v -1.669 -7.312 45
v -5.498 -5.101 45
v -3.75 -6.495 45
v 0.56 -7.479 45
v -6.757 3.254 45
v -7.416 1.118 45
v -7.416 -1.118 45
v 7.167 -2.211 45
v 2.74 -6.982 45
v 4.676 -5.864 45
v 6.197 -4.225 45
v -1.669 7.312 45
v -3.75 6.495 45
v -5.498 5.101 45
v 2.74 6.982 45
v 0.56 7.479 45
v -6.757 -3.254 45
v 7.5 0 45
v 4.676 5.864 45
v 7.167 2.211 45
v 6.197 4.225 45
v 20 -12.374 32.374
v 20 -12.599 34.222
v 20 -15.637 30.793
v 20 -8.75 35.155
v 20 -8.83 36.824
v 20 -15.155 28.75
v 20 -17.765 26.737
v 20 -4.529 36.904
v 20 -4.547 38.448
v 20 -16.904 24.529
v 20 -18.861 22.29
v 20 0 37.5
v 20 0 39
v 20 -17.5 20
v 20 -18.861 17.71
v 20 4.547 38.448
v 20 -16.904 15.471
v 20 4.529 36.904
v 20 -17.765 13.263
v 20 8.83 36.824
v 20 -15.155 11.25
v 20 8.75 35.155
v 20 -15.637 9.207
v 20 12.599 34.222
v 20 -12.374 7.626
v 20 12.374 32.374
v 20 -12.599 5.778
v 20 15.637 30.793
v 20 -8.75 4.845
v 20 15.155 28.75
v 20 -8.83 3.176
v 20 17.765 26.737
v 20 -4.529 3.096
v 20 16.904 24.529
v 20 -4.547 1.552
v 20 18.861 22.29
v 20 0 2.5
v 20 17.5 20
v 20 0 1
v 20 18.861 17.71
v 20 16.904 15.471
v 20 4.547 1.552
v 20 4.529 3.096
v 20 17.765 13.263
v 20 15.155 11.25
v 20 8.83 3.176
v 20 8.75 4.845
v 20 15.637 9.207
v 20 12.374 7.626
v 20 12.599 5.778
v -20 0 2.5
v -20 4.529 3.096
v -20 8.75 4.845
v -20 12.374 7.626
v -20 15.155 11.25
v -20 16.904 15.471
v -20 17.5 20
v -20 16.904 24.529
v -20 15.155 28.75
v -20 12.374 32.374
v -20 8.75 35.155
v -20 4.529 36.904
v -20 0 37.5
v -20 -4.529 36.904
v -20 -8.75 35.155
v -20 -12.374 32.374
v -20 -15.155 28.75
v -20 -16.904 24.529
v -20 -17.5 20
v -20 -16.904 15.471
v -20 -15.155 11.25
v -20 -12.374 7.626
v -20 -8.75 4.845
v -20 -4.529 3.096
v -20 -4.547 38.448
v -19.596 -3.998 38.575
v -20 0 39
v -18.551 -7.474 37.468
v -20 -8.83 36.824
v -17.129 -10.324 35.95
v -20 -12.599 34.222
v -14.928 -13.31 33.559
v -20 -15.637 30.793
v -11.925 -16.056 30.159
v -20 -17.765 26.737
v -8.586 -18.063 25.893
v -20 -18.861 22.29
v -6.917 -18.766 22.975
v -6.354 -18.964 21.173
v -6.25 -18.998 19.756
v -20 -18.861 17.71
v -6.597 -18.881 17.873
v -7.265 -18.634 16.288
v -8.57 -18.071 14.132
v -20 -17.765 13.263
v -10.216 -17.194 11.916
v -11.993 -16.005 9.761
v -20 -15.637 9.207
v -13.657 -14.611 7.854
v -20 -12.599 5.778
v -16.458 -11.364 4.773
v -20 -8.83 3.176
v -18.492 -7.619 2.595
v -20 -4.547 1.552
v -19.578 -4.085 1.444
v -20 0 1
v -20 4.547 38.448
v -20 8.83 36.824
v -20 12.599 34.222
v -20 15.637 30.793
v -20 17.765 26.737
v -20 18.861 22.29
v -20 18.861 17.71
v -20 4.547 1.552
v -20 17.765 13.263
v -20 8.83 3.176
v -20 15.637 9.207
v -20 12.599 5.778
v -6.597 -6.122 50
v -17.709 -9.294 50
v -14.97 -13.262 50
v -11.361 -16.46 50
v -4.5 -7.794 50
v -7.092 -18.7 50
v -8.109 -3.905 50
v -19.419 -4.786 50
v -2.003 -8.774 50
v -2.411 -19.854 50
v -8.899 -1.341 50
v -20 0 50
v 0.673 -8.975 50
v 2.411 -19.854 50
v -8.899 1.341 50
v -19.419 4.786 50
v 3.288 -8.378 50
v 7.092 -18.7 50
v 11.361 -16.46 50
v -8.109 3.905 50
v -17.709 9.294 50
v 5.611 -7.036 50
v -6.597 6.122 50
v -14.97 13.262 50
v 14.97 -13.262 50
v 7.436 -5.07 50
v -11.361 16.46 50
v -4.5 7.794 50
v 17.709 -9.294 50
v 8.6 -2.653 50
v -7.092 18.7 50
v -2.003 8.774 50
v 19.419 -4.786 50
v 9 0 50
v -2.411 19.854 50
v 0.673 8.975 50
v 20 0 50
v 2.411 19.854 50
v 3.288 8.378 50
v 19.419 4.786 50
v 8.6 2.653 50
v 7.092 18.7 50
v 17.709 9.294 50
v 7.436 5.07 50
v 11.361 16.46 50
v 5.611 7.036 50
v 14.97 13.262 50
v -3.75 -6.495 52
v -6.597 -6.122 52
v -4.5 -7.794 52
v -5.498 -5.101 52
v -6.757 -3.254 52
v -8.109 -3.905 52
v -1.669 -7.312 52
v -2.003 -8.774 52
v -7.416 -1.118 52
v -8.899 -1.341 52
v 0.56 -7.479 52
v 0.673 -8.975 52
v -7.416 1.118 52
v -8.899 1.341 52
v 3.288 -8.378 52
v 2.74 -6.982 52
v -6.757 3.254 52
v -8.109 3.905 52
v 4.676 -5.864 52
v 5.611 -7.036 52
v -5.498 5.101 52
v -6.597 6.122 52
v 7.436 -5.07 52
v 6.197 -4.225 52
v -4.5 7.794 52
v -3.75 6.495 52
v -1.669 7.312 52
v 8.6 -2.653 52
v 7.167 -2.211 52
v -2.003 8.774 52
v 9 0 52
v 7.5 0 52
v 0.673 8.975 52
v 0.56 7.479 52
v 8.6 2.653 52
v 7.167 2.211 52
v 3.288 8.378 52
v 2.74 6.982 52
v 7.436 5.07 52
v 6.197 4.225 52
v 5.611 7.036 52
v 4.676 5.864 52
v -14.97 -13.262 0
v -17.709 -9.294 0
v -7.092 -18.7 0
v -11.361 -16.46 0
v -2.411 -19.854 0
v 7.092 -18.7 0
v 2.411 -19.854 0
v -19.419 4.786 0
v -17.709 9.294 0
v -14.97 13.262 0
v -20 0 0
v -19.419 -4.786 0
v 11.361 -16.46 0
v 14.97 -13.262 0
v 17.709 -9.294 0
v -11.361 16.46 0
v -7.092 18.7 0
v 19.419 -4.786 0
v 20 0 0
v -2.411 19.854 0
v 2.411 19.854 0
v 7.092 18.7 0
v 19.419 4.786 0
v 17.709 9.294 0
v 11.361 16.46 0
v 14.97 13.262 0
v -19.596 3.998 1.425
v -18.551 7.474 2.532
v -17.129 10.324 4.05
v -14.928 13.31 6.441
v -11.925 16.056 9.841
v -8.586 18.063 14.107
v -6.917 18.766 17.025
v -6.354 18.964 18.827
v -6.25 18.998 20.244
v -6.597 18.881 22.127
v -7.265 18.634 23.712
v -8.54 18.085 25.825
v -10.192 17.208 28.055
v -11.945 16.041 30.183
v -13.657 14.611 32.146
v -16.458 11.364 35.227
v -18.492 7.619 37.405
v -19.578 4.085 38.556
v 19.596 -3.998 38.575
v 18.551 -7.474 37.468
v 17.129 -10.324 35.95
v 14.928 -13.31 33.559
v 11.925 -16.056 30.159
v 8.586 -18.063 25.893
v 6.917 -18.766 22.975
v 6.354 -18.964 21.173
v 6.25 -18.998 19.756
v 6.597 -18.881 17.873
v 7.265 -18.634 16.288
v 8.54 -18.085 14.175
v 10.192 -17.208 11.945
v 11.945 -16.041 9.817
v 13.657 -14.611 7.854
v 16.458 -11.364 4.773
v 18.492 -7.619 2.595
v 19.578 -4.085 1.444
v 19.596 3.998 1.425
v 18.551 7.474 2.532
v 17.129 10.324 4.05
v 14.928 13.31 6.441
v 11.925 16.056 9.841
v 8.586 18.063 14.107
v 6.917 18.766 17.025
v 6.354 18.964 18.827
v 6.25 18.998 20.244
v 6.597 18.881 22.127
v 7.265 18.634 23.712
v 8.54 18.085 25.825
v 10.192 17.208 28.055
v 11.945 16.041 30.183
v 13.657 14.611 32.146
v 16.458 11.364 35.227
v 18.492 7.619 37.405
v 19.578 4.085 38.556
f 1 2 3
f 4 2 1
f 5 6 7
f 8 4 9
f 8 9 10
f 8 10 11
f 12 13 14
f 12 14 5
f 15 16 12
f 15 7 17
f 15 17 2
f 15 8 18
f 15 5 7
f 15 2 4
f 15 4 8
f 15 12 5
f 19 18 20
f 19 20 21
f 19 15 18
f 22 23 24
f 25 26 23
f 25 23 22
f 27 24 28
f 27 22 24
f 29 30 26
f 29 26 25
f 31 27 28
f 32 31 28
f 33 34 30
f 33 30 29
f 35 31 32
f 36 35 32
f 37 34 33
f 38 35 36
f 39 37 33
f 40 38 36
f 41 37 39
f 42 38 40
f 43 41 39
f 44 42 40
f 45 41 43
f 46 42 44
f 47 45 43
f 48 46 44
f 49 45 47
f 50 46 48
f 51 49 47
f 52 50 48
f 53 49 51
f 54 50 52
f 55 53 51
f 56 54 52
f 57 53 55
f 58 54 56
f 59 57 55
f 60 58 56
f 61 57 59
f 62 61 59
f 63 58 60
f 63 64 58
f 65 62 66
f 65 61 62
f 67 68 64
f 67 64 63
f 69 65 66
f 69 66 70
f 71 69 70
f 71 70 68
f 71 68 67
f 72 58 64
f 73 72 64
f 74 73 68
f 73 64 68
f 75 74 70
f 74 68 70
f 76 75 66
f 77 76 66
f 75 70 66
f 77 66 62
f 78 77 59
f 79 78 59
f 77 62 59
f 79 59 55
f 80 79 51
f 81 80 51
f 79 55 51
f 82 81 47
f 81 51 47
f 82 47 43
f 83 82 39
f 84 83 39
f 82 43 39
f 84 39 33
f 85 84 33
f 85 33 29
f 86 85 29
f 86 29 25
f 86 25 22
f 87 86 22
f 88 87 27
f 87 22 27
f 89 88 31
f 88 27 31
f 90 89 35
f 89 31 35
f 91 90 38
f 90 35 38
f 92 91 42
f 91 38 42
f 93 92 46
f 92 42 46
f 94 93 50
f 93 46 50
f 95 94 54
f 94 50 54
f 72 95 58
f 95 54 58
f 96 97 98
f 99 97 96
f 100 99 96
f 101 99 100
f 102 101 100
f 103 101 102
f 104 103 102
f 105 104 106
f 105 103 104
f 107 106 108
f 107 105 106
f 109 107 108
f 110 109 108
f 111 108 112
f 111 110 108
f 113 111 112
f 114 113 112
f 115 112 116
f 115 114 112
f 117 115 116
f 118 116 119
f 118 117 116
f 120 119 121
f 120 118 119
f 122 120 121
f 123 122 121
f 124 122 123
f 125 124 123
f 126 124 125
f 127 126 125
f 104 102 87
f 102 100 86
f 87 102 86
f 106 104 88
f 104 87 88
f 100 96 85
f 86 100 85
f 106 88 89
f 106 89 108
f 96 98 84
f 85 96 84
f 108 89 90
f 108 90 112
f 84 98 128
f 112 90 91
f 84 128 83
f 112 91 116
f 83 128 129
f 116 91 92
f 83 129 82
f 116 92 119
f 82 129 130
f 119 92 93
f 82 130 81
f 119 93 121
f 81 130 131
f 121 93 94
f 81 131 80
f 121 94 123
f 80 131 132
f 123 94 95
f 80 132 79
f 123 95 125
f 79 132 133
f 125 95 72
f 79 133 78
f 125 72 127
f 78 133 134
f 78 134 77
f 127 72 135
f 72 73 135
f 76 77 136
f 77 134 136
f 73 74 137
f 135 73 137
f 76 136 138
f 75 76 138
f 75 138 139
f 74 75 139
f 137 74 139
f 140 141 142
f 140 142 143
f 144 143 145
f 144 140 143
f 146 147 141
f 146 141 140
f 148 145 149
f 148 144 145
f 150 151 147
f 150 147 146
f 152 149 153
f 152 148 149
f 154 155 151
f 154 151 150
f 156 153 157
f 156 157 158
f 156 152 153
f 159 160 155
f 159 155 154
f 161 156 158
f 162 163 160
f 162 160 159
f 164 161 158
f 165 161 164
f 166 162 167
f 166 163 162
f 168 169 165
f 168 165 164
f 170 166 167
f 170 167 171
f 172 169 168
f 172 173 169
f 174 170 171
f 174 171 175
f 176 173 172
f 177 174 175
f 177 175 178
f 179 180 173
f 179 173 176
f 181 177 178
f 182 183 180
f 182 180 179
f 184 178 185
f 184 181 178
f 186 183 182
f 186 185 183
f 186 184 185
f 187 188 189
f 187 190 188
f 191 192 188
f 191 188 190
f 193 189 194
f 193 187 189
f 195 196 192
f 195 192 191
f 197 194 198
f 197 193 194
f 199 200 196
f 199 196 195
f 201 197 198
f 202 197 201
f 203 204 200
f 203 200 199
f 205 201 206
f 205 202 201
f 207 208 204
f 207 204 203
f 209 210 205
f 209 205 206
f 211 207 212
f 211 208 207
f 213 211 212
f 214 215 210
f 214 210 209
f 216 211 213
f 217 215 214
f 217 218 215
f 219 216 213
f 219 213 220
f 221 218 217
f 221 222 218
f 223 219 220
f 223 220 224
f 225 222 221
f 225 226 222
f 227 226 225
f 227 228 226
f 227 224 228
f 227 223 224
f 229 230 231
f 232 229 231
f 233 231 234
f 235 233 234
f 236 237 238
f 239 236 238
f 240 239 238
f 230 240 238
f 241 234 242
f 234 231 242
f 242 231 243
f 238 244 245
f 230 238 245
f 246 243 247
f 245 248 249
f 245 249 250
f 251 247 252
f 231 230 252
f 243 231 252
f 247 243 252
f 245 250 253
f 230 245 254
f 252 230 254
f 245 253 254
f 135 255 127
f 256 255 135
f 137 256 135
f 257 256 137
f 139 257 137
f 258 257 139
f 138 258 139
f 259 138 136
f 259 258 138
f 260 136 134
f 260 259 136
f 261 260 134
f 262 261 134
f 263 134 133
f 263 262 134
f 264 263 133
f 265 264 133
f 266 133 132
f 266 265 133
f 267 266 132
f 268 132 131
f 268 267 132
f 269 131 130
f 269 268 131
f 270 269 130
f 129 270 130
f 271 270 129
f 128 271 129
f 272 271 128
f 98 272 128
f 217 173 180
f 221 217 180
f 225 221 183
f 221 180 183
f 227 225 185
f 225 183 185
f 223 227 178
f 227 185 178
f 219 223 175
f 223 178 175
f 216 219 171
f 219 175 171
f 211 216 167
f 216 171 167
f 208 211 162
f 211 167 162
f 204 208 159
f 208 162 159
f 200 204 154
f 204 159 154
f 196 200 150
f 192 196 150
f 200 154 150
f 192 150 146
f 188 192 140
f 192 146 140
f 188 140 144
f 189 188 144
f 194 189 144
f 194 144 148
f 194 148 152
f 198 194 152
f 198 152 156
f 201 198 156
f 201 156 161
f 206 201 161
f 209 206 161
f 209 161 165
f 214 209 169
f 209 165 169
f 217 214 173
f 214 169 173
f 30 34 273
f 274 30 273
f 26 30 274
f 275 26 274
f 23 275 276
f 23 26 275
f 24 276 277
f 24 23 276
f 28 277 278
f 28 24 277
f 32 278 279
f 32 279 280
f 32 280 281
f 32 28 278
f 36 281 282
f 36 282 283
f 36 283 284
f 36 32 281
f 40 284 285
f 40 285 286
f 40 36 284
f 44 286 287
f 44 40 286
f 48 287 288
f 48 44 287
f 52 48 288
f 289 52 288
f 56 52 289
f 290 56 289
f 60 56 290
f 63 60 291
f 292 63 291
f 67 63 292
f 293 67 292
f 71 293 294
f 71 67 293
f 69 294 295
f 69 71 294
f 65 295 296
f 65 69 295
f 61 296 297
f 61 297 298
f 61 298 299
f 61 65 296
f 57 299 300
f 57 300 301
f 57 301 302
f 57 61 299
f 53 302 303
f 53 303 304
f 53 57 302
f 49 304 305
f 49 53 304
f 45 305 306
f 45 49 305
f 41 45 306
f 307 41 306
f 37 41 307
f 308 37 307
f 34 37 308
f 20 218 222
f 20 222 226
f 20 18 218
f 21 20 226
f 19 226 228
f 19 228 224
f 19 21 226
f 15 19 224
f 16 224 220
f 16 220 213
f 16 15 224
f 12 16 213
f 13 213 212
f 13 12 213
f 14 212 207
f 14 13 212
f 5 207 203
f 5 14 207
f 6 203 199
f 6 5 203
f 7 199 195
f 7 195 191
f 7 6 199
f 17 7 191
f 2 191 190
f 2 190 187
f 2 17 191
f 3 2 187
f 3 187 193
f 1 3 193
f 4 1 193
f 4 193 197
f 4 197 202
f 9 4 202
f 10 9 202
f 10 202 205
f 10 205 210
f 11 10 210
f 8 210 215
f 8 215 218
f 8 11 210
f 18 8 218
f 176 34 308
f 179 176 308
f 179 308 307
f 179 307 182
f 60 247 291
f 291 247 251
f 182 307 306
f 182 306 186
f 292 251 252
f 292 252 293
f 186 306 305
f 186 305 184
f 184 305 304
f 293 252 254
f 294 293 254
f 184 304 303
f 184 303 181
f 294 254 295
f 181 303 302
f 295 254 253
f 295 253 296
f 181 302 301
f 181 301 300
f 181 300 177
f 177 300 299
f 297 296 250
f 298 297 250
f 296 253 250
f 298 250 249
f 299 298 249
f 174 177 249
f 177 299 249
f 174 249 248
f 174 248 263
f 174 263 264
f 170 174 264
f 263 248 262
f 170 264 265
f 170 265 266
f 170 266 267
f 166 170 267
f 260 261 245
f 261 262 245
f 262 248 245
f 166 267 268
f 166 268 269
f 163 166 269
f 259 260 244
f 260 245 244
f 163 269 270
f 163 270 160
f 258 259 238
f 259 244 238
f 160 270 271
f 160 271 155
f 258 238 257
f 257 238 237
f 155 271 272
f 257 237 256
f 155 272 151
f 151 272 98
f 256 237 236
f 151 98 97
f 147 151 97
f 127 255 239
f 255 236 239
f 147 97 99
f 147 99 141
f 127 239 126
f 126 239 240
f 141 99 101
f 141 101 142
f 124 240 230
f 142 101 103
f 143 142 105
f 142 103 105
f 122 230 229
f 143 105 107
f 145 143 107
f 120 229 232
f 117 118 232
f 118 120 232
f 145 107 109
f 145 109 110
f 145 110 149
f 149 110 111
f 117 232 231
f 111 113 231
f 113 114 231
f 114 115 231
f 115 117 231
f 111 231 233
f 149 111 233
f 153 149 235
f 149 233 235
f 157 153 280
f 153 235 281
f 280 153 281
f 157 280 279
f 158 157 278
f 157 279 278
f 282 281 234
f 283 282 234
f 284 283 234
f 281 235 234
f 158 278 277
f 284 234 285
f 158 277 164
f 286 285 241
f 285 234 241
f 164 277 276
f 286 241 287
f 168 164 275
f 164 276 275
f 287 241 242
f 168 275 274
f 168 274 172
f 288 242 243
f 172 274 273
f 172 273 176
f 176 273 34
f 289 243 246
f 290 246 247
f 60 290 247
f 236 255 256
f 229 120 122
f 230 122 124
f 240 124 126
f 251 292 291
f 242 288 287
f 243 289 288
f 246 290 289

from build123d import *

# Parameters (mm, degrees)
SKETCH1_R           = 20
BOSS_EXTRUDE1_DEPTH = 50
SKETCH2_R           = 19
BOSS_EXTRUDE2_DEPTH = 20
SKETCH4_R           = 17.5
CUT_EXTRUDE1_DEPTH  = 40
SKETCH5_R           = 7.5
CUT_EXTRUDE2_DEPTH  = 5
SKETCH6_R           = 9
SKETCH6_R_2         = 7.5
BOSS_EXTRUDE3_DEPTH = 2


with BuildPart() as part:
    # Sketch1 → Boss-Extrude1 (new body)
    with BuildSketch(Plane.XY):
        Circle(SKETCH1_R)
    extrude(amount=BOSS_EXTRUDE1_DEPTH)

    # Sketch2 → Boss-Extrude2 (add, symmetric)
    with BuildSketch(Plane(origin=(0, 0, 0), x_dir=(0, 0, -1), z_dir=(1, 0, 0))):
        with Locations((-20, 0)):
            Circle(SKETCH2_R)
    extrude(amount=BOSS_EXTRUDE2_DEPTH, both=True)

    # Sketch4 → Cut-Extrude1 (cut)
    with BuildSketch(Plane(origin=(20, 0, 0), x_dir=(0, 0, -1), z_dir=(1, 0, 0))):
        with Locations((-20, 0)):
            Circle(SKETCH4_R)
    extrude(amount=-CUT_EXTRUDE1_DEPTH, mode=Mode.SUBTRACT)

    # Sketch5 → Cut-Extrude2 (cut)
    with BuildSketch(Plane.XY.offset(50)):
        Circle(SKETCH5_R)
    extrude(amount=-CUT_EXTRUDE2_DEPTH, mode=Mode.SUBTRACT)

    # Sketch6 → Boss-Extrude3 (add)
    with BuildSketch(Plane.XY.offset(50)):
        Circle(SKETCH6_R)
        Circle(SKETCH6_R_2, mode=Mode.SUBTRACT)
    extrude(amount=BOSS_EXTRUDE3_DEPTH)


solid = part.part
